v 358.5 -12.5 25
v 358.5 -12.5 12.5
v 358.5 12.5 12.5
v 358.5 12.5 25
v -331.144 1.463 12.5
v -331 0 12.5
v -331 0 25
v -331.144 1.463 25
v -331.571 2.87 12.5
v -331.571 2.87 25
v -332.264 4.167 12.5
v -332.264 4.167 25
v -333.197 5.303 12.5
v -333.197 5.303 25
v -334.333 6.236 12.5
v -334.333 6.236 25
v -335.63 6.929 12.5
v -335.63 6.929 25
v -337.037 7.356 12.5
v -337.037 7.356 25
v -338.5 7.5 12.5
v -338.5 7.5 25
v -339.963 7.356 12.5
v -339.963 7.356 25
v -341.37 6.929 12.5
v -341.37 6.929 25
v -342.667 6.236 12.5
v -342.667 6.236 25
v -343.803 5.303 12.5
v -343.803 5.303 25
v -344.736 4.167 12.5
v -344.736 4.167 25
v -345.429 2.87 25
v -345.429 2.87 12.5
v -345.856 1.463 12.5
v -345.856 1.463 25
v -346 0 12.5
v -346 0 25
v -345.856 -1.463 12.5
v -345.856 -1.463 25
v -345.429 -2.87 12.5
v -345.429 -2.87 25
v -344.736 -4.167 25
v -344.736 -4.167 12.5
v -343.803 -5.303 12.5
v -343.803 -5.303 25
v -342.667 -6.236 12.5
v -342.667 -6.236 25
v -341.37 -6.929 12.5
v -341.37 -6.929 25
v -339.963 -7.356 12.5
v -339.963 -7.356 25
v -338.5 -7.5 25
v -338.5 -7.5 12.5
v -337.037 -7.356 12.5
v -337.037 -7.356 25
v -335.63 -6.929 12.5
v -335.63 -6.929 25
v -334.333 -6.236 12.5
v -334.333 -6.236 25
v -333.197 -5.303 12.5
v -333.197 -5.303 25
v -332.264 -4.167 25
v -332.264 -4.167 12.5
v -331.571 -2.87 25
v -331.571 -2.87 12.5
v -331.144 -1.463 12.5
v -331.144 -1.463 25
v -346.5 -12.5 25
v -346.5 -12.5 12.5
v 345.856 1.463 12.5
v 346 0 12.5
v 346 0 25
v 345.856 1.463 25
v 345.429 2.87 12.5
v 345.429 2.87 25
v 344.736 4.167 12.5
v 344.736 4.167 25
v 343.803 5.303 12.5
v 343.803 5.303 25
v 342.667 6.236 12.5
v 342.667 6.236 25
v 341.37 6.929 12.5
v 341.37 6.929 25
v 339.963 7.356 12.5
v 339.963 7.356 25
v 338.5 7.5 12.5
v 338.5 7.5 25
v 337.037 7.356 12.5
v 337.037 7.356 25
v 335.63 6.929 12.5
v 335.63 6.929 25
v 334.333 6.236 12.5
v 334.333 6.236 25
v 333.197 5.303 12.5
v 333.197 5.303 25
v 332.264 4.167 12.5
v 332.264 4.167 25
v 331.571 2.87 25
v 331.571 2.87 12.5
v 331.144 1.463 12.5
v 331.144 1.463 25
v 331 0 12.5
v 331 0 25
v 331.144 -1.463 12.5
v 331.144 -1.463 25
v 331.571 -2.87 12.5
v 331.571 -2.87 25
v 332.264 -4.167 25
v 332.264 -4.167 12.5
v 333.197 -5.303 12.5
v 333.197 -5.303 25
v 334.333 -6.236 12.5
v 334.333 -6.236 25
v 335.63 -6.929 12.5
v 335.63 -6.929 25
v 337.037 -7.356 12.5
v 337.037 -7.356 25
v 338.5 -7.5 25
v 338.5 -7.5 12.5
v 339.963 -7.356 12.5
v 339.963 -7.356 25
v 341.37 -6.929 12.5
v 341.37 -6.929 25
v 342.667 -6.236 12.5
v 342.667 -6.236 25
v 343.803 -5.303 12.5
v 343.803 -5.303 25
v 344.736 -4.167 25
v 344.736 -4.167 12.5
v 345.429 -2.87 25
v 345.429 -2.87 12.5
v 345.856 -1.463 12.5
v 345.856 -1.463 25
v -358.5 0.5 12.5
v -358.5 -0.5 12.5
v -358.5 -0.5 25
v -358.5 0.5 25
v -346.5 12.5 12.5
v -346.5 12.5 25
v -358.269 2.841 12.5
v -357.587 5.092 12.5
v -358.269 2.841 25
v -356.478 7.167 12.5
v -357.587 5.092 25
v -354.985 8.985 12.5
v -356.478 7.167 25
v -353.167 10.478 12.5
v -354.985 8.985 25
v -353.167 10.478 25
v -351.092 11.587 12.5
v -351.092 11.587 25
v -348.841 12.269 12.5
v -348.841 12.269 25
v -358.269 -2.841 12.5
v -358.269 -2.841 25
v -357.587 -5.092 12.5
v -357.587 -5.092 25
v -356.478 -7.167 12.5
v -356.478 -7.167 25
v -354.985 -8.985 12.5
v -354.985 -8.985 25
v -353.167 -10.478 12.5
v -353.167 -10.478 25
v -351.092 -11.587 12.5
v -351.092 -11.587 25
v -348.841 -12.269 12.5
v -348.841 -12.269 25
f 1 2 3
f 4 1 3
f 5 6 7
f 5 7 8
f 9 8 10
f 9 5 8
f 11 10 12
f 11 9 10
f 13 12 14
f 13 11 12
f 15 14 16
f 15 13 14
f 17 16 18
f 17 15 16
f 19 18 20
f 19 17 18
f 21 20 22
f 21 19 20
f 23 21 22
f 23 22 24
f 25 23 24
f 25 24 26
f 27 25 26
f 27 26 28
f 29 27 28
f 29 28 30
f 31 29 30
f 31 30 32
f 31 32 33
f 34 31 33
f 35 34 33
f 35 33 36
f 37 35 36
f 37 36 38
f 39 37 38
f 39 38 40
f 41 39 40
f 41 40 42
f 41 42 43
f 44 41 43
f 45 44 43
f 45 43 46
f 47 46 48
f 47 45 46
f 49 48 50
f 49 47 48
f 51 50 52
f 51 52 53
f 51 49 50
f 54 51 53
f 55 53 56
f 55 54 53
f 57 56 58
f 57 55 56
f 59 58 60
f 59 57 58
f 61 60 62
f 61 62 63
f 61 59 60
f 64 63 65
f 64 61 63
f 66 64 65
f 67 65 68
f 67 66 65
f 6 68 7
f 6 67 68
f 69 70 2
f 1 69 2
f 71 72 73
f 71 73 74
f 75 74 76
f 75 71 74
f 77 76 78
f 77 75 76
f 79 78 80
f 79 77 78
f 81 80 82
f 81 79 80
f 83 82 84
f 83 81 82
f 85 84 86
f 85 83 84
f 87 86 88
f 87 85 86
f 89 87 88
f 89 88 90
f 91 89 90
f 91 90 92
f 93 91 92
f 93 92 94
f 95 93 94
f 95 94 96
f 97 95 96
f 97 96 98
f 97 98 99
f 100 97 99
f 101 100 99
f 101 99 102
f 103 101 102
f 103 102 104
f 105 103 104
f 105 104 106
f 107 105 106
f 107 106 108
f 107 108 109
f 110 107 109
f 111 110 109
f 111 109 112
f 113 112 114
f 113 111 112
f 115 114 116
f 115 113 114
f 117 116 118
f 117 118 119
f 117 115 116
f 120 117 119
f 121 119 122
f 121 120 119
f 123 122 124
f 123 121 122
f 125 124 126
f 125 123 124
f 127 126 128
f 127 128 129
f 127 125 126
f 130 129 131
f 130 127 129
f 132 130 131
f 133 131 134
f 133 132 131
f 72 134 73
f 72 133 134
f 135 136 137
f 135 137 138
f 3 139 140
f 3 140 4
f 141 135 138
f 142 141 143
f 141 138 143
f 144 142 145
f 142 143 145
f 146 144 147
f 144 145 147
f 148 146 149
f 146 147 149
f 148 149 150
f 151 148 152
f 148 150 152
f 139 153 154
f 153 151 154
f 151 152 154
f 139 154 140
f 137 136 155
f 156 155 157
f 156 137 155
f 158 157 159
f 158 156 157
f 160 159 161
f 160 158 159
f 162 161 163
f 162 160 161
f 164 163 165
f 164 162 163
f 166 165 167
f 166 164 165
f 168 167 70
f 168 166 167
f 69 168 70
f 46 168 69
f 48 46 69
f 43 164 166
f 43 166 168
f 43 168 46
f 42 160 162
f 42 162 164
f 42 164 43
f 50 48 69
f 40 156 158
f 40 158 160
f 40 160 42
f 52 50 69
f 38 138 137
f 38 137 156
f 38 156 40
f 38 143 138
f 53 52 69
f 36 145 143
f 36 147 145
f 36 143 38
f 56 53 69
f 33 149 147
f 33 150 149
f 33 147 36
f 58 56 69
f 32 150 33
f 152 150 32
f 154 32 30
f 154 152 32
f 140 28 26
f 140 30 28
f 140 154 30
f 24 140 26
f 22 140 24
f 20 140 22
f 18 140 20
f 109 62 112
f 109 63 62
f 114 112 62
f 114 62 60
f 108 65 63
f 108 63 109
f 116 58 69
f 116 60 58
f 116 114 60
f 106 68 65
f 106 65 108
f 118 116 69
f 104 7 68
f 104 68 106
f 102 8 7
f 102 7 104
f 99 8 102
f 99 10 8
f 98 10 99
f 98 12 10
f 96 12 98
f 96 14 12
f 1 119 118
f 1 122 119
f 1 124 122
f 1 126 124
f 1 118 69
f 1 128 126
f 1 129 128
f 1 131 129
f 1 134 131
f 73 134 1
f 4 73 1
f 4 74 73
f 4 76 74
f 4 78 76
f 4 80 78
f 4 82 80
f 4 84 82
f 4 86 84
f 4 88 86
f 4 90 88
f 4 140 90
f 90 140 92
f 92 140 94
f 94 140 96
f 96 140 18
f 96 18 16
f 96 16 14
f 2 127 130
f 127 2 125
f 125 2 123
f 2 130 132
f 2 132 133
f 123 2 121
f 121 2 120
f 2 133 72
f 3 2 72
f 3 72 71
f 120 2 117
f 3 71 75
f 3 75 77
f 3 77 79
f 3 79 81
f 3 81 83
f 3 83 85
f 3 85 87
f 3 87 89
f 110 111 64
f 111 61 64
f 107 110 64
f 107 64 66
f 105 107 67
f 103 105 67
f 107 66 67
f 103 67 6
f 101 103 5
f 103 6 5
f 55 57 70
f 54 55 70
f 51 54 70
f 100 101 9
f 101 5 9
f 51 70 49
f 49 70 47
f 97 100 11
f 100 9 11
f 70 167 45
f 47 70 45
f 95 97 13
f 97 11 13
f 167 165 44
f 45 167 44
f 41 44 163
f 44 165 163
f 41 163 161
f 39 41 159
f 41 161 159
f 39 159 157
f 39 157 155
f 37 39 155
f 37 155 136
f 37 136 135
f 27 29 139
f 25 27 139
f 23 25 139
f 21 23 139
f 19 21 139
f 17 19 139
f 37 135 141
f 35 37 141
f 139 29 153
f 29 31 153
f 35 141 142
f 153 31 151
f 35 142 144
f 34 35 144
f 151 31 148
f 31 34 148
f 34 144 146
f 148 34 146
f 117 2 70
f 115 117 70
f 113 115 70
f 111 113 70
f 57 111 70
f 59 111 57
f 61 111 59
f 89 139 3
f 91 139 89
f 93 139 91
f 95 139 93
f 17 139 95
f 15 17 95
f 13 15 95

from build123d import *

# Parameters (mm, degrees)
SKETCH1_W               = 717
SKETCH1_H               = 25
SKETCH1_R               = 7.5
BOSS_EXTRUDE1_DEPTH     = 25
FILLET1_R               = 12
CUT_EXTRUDE1_DEPTH      = 718.544597917
CUT_EXTRUDE1_DEPTH_BACK = 718.544597917
SKETCH2_W               = 12.5
SKETCH2_H               = 25


with BuildPart() as part:
    # Sketch1 → Boss-Extrude1 (new body)
    with BuildSketch(Plane.XY):
        Rectangle(SKETCH1_W, SKETCH1_H)
        with Locations((-338.5, 0)):
            Circle(SKETCH1_R, mode=Mode.SUBTRACT)
        with Locations((338.5, 0)):
            Circle(SKETCH1_R, mode=Mode.SUBTRACT)
    extrude(amount=BOSS_EXTRUDE1_DEPTH)

    # Fillet1
    fillet1_edges = [part.edges().sort_by_distance(p)[0] for p in [
        (-358.5, -12.5, 12.5),
        (-358.5, 12.5, 12.5),
    ]]
    fillet(fillet1_edges, radius=FILLET1_R)

    # Sketch2 → Cut-Extrude1 (cut, two sides: drawn at the far end of the back side and taken through both)
    with BuildSketch(Plane(origin=(358.5, 0, 0), x_dir=(0, 0, -1), z_dir=(1, 0, 0)).offset(-CUT_EXTRUDE1_DEPTH_BACK)):
        with Locations((-6.25, 0)):
            Rectangle(SKETCH2_W, SKETCH2_H)
    extrude(amount=CUT_EXTRUDE1_DEPTH + CUT_EXTRUDE1_DEPTH_BACK, mode=Mode.SUBTRACT)


solid = part.part
